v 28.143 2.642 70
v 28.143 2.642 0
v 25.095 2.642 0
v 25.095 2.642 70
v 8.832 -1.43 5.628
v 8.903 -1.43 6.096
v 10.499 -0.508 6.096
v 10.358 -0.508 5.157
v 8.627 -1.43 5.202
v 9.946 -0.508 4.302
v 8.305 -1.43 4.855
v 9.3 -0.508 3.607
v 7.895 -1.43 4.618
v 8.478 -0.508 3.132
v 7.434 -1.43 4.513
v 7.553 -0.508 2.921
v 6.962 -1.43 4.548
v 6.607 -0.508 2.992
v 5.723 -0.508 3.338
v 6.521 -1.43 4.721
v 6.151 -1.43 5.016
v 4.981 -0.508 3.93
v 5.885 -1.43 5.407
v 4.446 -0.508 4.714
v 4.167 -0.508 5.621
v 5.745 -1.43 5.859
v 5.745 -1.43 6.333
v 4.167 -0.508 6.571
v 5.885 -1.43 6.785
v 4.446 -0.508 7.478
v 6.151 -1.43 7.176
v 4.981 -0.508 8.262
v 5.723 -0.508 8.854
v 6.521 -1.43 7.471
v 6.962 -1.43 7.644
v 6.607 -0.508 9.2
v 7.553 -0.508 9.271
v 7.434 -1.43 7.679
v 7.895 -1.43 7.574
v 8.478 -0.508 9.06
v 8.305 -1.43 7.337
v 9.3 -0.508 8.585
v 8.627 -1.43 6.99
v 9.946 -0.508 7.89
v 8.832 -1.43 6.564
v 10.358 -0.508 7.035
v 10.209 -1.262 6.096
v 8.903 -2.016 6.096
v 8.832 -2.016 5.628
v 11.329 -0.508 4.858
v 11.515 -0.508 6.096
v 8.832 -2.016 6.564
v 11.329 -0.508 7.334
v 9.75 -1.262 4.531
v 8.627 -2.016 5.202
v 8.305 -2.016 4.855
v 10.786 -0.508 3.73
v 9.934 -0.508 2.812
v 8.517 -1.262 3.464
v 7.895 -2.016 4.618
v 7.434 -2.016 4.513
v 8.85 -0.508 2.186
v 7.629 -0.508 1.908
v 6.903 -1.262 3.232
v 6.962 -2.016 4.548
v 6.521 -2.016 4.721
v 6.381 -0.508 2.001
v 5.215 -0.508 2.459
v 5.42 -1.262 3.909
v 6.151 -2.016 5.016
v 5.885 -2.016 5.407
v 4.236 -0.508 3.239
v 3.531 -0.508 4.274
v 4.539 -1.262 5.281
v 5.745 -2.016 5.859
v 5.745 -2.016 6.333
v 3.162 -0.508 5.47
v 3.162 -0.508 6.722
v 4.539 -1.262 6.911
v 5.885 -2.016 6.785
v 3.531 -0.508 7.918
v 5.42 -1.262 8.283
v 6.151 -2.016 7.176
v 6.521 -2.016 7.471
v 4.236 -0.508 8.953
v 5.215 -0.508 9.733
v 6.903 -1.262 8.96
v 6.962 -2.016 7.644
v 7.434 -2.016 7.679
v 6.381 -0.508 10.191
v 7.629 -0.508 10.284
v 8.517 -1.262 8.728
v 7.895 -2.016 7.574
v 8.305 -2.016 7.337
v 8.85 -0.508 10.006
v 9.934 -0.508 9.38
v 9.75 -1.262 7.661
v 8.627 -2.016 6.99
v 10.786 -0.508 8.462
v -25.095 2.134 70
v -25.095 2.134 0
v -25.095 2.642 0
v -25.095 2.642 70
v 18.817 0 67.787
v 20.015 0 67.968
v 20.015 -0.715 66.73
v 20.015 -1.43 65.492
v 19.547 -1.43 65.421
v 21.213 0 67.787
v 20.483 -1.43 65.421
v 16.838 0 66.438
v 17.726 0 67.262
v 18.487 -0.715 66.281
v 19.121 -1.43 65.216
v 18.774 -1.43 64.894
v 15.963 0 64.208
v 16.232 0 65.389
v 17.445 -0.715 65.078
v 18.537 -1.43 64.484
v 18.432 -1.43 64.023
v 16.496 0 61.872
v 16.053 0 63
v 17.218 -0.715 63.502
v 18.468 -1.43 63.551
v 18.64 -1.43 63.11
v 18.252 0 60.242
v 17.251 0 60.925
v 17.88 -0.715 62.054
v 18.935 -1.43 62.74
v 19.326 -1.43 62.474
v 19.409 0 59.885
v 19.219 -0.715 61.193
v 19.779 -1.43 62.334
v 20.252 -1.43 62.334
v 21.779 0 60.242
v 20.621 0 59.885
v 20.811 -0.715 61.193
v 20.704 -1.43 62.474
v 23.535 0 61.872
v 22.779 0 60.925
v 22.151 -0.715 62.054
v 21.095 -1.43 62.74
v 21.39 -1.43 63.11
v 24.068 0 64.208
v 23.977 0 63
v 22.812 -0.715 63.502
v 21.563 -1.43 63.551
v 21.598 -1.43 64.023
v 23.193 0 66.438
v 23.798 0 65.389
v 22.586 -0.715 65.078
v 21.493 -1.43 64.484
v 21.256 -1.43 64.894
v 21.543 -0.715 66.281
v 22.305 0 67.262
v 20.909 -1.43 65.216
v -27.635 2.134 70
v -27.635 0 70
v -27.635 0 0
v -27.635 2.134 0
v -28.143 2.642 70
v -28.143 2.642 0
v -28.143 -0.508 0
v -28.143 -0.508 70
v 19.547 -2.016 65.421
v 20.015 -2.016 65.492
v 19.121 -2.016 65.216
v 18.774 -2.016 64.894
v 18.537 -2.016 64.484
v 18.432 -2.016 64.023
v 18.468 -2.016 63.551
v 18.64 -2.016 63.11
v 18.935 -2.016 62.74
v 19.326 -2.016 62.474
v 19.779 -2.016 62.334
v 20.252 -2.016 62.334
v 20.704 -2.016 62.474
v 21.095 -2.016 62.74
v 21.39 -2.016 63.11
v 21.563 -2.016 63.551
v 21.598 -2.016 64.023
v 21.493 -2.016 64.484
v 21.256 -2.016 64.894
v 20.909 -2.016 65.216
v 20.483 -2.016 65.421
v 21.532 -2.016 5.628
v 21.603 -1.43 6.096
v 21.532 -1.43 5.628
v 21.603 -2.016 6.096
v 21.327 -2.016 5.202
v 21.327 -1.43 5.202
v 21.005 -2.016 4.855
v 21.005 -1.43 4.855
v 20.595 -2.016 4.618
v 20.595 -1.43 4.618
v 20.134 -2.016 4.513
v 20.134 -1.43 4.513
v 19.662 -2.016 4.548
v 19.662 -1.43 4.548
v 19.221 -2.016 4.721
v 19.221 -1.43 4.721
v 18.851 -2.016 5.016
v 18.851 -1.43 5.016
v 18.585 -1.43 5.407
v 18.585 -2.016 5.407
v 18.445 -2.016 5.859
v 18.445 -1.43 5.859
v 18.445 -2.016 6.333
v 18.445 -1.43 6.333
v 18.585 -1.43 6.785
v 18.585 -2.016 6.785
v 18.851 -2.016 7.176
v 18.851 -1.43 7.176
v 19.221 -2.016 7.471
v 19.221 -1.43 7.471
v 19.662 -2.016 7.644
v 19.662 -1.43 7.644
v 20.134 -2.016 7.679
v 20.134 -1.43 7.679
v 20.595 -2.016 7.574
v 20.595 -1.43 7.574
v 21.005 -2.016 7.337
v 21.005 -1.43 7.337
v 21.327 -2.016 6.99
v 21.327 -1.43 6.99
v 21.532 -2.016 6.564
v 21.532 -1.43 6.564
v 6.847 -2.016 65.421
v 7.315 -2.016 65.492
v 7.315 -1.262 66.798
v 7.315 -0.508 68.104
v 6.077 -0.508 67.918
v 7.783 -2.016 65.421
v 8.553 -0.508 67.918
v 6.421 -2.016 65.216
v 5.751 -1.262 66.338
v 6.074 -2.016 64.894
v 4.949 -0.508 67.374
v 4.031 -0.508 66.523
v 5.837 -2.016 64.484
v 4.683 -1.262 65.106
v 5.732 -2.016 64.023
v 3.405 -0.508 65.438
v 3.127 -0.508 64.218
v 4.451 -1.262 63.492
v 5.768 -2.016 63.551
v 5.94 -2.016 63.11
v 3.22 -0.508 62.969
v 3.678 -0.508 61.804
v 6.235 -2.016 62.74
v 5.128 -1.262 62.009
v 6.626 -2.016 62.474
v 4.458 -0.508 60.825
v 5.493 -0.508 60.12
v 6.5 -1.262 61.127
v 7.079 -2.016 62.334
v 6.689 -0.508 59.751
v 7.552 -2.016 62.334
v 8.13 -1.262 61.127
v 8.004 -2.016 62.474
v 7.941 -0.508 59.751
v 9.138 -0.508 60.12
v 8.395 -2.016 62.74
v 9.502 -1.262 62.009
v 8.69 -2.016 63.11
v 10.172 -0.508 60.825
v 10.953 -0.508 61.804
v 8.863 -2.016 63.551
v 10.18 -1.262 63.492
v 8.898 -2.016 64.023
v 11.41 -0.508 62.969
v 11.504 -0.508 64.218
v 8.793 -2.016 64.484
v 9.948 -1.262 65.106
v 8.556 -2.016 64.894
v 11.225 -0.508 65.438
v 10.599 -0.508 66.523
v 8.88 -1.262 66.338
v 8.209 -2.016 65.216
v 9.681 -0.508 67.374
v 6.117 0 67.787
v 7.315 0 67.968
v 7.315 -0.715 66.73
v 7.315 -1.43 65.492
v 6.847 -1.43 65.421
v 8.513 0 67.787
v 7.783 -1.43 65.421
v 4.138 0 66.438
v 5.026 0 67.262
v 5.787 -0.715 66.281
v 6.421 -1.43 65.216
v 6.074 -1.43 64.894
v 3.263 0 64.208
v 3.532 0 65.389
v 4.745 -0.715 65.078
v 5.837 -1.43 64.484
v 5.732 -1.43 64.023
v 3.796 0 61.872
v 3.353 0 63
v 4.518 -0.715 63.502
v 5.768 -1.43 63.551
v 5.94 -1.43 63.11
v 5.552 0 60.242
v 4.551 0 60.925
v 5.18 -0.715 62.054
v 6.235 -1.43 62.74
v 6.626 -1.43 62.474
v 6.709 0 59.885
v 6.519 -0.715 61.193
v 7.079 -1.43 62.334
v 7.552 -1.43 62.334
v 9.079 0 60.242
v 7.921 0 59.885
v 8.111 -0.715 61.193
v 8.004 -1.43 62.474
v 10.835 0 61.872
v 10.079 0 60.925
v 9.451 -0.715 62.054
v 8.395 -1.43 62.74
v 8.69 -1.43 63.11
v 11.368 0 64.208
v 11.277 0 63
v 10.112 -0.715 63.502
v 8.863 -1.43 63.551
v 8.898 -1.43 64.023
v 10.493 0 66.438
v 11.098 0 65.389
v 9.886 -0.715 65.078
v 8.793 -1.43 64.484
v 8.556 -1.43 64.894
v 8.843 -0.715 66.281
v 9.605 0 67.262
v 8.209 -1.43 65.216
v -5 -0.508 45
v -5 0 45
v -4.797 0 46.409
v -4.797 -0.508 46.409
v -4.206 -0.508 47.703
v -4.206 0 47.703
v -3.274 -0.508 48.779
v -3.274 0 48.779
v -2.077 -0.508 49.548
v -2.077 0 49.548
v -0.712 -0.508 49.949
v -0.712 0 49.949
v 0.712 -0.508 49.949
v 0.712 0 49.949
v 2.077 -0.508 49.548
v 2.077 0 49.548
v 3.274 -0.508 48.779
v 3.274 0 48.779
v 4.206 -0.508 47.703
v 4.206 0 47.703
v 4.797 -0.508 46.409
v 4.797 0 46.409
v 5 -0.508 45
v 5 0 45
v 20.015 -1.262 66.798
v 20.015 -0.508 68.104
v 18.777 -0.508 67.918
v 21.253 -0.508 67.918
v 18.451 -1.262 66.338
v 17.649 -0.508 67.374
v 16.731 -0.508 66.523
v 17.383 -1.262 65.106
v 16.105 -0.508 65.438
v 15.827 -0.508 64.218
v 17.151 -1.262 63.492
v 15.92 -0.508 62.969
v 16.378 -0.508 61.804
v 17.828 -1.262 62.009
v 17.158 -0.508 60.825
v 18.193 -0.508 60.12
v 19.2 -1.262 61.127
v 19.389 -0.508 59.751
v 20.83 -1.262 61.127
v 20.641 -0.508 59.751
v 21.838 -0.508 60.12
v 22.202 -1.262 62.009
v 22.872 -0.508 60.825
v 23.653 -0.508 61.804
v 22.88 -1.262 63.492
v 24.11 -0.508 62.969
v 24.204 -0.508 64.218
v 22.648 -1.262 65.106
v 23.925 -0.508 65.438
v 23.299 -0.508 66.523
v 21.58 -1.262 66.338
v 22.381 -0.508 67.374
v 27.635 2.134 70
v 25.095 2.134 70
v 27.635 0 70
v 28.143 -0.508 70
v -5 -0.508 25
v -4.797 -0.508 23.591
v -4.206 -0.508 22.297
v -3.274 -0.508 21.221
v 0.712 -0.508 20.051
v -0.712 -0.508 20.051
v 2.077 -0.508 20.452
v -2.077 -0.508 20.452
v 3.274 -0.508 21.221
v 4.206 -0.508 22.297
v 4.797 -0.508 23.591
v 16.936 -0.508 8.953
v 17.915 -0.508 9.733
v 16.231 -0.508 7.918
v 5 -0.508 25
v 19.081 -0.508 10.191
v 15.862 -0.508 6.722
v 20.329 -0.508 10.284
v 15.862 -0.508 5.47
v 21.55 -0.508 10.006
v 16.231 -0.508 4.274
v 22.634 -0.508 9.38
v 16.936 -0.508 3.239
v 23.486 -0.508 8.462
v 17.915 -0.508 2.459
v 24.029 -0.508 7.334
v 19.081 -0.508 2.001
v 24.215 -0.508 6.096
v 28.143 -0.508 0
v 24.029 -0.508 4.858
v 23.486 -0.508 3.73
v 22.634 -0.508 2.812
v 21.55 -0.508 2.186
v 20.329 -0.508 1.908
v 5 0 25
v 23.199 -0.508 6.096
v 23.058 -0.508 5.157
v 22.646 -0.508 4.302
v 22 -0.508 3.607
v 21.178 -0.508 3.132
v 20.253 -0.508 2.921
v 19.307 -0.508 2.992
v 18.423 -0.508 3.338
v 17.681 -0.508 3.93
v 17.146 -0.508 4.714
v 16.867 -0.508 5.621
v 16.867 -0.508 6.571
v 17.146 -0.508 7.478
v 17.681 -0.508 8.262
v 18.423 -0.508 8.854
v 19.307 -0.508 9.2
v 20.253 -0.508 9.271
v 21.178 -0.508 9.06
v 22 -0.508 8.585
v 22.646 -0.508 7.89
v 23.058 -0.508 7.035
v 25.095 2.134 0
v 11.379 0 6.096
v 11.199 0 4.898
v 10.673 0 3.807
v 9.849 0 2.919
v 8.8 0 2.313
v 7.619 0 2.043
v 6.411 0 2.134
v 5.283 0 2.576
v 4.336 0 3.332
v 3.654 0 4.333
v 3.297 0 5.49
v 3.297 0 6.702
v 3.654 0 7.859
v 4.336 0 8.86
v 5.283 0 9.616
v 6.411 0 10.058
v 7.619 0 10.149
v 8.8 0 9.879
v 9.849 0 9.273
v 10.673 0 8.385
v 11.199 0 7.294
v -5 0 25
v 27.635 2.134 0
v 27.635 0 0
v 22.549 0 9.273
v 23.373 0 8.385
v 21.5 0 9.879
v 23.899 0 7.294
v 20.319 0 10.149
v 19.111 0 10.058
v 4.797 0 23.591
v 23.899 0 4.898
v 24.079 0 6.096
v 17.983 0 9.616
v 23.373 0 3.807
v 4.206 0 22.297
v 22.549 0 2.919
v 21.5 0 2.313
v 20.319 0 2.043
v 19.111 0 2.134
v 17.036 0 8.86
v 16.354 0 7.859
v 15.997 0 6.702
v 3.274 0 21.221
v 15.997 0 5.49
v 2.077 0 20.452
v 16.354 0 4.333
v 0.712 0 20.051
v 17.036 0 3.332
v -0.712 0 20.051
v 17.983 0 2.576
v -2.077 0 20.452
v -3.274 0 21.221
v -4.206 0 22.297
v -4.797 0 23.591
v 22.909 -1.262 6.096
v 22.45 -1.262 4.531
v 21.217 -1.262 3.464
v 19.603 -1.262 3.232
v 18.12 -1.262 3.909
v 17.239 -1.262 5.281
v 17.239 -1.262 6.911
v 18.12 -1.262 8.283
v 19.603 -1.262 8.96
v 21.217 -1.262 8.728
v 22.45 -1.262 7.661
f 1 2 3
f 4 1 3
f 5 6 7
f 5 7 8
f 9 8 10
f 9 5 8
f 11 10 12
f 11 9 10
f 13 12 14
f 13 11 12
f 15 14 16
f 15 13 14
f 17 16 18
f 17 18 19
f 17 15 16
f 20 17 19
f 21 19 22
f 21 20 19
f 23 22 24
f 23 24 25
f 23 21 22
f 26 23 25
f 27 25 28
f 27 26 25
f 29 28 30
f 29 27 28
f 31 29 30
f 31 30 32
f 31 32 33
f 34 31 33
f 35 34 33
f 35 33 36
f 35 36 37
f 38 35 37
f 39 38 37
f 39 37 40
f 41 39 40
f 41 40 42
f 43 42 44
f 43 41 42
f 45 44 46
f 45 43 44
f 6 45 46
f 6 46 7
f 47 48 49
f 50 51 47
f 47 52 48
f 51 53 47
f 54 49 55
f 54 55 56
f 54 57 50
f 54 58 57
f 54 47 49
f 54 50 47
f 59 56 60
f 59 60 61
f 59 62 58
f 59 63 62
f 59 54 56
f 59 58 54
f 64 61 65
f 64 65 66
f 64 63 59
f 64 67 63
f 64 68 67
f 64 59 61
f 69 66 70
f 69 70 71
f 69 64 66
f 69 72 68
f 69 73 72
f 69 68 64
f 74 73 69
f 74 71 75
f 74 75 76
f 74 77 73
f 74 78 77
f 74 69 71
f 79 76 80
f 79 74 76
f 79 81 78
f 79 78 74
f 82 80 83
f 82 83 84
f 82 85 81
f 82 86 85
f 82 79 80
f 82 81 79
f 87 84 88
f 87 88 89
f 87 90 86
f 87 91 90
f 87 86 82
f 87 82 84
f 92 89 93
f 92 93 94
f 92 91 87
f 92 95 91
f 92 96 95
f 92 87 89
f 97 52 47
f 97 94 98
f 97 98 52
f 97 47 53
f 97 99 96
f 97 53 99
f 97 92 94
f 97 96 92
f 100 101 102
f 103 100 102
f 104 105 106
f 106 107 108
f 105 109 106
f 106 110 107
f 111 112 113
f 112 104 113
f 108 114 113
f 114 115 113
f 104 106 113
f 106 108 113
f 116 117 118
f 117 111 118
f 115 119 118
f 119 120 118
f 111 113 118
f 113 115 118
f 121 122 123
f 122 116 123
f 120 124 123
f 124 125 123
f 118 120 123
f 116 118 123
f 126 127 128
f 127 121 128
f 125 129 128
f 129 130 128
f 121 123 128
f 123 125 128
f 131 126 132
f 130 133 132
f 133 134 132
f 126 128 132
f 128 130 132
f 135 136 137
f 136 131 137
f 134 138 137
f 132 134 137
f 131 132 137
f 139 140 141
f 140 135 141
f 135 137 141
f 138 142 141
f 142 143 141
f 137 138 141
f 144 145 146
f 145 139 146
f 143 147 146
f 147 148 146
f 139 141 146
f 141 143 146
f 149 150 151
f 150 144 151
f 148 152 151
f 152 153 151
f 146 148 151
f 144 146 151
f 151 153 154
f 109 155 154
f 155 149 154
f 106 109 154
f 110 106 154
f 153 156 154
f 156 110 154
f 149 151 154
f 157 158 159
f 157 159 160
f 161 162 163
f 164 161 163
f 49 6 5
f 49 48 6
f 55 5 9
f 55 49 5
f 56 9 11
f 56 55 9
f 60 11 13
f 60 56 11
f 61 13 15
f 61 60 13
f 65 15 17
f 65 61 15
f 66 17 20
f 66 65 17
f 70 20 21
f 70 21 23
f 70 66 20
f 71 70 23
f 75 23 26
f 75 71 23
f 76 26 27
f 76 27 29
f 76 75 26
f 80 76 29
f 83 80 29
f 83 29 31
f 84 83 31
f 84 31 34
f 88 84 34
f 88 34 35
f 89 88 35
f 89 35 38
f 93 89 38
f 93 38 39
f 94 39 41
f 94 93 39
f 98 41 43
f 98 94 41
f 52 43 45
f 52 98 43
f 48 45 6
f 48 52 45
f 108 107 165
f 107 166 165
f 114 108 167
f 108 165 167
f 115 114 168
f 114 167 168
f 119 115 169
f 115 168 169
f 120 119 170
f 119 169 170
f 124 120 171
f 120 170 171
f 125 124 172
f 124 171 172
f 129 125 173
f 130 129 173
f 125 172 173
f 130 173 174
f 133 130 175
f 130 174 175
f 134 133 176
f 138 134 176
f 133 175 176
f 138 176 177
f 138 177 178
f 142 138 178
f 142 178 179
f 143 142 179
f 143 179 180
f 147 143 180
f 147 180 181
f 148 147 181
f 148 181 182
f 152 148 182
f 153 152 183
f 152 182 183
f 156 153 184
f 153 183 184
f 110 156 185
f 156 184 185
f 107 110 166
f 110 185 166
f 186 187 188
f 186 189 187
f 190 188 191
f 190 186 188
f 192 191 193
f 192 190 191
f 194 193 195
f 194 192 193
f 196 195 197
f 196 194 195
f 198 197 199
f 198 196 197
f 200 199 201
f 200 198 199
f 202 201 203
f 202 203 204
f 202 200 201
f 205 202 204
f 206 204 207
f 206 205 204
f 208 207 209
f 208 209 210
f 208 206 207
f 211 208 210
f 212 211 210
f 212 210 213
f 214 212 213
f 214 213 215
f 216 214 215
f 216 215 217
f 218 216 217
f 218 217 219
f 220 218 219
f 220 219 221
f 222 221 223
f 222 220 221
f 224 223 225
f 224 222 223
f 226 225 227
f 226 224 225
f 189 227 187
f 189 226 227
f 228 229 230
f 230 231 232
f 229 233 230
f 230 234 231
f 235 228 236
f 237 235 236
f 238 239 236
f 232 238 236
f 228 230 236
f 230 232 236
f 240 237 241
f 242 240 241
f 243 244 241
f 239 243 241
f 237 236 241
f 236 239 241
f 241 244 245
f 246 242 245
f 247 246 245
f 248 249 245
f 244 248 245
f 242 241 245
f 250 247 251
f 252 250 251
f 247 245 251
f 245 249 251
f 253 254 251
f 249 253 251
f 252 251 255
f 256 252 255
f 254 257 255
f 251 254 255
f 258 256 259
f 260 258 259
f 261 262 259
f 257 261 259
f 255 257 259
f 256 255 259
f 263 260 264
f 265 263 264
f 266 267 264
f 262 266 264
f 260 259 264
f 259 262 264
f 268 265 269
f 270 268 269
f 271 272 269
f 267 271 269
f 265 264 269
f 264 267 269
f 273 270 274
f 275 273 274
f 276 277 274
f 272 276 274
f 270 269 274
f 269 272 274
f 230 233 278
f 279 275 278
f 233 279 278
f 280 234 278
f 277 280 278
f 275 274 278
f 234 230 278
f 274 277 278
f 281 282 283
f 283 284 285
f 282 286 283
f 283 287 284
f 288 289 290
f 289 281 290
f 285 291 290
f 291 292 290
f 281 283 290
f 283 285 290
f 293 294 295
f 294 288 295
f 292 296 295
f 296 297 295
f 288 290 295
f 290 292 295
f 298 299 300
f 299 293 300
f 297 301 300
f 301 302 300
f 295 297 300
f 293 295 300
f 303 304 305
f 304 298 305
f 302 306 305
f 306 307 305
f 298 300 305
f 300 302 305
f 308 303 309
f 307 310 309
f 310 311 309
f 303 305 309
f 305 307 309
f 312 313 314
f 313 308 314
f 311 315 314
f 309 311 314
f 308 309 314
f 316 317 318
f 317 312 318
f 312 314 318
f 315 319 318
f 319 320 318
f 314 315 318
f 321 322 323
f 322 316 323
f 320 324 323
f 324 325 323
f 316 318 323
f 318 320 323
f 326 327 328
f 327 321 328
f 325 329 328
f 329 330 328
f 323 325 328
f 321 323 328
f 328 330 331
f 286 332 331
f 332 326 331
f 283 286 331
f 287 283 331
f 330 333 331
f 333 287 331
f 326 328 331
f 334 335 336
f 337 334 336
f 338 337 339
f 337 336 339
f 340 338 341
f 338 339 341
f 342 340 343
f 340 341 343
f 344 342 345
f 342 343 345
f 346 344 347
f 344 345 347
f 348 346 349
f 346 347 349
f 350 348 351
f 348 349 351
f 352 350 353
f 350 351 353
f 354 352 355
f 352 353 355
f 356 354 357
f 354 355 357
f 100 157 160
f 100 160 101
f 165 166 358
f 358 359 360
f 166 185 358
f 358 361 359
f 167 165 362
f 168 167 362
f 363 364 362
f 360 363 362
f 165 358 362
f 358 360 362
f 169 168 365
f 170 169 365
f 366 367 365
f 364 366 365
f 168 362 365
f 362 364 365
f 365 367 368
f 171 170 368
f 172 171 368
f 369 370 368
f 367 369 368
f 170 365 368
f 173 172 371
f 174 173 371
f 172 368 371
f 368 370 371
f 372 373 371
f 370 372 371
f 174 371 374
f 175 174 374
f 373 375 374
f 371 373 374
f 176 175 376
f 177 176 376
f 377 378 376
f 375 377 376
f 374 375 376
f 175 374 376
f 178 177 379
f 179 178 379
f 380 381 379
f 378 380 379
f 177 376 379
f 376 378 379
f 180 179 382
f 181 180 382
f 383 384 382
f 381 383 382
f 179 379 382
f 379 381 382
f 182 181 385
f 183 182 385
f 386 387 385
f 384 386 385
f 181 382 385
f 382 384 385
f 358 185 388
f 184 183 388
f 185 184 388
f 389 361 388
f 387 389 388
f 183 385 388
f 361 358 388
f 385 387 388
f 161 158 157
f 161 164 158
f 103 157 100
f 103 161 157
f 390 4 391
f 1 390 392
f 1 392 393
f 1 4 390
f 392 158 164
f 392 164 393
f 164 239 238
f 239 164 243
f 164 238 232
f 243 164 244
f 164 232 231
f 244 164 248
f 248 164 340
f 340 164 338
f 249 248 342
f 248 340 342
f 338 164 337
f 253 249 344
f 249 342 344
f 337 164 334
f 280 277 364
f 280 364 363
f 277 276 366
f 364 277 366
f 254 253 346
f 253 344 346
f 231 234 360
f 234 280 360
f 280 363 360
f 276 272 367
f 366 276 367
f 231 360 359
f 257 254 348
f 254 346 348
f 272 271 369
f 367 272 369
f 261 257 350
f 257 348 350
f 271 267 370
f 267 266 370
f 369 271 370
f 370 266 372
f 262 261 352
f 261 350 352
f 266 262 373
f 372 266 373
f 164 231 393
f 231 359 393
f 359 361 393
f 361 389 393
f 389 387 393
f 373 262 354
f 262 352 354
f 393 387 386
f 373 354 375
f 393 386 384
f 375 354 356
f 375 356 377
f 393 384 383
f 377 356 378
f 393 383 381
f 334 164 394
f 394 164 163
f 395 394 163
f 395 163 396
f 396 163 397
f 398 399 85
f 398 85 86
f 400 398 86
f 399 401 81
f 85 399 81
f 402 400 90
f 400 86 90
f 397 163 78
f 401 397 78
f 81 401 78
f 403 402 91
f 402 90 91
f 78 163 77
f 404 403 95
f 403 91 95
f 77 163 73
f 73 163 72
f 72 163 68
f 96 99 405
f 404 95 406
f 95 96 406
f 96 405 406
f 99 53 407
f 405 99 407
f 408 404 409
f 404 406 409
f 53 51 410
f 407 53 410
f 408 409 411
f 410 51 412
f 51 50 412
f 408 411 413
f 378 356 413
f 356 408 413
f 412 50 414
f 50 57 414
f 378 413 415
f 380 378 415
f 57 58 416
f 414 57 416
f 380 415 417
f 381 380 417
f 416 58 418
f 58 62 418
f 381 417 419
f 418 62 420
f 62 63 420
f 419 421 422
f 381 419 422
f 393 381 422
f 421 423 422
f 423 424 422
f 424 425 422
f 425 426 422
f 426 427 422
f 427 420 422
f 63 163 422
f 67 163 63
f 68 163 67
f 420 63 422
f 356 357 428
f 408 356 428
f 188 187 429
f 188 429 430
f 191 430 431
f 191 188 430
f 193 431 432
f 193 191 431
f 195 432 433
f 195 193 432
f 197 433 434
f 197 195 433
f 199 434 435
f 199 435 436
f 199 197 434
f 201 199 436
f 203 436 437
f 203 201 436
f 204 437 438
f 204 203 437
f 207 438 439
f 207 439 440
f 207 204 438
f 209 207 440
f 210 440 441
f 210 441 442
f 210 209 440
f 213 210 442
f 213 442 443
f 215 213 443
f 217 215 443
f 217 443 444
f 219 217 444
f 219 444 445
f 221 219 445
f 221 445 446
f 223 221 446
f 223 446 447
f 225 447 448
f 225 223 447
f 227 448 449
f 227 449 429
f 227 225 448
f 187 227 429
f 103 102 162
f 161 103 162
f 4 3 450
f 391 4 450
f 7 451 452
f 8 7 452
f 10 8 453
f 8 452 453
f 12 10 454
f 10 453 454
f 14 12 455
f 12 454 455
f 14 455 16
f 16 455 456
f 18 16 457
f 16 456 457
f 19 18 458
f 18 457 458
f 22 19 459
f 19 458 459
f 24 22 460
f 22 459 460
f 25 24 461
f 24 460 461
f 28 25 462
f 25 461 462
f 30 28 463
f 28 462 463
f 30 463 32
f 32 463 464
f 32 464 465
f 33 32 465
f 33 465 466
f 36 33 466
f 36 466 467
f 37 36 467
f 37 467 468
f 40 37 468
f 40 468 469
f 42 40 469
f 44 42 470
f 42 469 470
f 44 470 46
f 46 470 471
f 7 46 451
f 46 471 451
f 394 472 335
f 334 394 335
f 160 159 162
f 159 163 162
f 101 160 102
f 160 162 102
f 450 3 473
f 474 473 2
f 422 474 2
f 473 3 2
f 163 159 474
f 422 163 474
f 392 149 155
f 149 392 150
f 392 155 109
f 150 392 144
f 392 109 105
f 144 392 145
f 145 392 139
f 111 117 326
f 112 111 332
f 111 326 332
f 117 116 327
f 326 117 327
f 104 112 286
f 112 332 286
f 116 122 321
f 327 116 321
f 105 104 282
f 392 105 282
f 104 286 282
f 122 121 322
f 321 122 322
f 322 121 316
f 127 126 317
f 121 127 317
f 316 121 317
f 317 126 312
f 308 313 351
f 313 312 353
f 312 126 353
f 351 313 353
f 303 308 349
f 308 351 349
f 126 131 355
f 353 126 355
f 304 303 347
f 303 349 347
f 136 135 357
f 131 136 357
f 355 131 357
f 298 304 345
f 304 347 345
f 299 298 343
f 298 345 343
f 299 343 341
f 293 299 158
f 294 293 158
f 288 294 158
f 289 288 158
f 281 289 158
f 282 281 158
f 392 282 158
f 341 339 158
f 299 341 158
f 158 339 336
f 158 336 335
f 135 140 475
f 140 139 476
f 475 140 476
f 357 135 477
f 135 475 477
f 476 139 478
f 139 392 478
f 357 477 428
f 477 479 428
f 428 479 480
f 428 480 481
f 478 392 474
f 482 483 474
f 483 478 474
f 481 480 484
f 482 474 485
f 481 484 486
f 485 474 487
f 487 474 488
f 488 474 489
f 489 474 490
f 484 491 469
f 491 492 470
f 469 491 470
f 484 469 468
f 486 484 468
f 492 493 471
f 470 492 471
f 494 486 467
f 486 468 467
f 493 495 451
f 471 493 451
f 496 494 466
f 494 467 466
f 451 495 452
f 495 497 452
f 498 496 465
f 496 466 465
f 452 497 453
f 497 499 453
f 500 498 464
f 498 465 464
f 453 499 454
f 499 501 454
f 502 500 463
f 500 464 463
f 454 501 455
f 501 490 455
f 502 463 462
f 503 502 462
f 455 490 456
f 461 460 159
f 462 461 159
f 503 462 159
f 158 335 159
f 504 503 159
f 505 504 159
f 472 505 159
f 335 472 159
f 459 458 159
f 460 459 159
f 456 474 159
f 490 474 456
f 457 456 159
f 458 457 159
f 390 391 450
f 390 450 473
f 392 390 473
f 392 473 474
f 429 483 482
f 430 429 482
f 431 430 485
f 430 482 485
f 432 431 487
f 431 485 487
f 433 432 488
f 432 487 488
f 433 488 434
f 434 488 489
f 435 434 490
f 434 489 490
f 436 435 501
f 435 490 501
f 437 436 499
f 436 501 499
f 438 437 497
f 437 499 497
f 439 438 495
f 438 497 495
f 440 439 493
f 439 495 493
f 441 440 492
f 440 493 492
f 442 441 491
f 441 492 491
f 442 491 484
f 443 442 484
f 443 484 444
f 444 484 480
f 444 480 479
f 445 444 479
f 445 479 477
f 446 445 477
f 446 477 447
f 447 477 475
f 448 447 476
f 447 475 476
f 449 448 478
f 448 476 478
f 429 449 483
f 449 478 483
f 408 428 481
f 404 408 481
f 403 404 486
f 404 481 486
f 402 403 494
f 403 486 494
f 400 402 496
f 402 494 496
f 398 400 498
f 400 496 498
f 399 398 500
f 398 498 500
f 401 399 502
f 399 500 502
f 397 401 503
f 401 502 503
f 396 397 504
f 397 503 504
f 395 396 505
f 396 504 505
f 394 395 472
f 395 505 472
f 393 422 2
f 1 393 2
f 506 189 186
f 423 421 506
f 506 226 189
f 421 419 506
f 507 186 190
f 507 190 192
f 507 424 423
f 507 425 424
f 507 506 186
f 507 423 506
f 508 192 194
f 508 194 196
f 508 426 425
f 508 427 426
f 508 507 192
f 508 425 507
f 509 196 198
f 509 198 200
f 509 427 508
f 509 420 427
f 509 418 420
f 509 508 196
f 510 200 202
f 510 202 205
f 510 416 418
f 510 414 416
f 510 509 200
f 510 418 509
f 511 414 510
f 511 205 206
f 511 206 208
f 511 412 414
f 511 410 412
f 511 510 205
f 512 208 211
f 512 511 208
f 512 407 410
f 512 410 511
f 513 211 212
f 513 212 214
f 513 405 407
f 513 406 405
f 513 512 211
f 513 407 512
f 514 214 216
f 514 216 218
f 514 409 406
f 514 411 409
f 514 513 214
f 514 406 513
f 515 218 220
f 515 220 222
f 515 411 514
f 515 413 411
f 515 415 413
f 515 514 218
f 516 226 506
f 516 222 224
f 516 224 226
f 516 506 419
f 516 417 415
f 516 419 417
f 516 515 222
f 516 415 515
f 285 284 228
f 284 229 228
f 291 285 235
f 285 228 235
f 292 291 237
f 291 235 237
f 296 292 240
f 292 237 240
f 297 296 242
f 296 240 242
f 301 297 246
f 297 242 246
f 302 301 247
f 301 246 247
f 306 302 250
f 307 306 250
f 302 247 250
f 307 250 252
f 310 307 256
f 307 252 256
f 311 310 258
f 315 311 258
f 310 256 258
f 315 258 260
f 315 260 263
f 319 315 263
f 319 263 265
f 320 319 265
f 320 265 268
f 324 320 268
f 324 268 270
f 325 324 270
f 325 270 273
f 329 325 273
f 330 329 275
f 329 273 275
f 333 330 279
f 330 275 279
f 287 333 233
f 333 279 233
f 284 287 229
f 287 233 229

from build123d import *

# Parameters (mm, degrees)
EXTRUDE_THIN3_DEPTH     = 70
CUT_EXTRUDE1_DEPTH      = 76.511321578
CUT_EXTRUDE1_DEPTH_BACK = 76.511321578
SKETCH9_R               = 4.064
CUT_EXTRUDE2_DEPTH      = 2.54
LPATTERN1_COUNT         = 2
LPATTERN1_PITCH         = 12.7


# Read off the part's stored shape, not the designer's step: Mirror1
with BuildPart() as part:
    # Sketch6 → Extrude-Thin3 (new body)
    with BuildSketch(Plane.XY):
        Polygon((25.0952, 2.1336), (27.6352, 2.1336), (27.6352, 0), (-27.6352, 0), (-27.6352, 2.1336), (-25.0952, 2.1336), (-25.0952, 2.6416), (-28.1432, 2.6416), (-28.1432, -0.508), (28.1432, -0.508), (28.1432, 2.6416), (25.0952, 2.6416), align=None)
    extrude(amount=EXTRUDE_THIN3_DEPTH)

    # Sketch8 → Cut-Extrude1 (cut, two sides: drawn at the far end of the back side and taken through both)
    with BuildSketch(Plane.XZ.offset(0.508).offset(-CUT_EXTRUDE1_DEPTH_BACK)):
        with BuildLine():
            Line((5, 45), (5, 25))
            ThreePointArc((5, 25), (0, 20), (-5, 25))
            Line((-5, 25), (-5, 45))
            ThreePointArc((-5, 45), (0, 50), (5, 45))
        make_face()
    extrude(amount=CUT_EXTRUDE1_DEPTH + CUT_EXTRUDE1_DEPTH_BACK, mode=Mode.SUBTRACT)

    # Sketch9 → Cut-Extrude2 (cut)
    with BuildSketch(Plane.XZ.offset(0.508)):
        with Locations(Location((20.0152, 63.904, 0), (0, 0, 270))):
            Circle(SKETCH9_R)
    cut_extrude2 = extrude(amount=-CUT_EXTRUDE2_DEPTH, mode=Mode.SUBTRACT)

    # Sketch10 → Revolve1 (revolve)
    with BuildSketch(Plane(origin=(0, 0, 63.904), x_dir=(0, -1, 0), z_dir=(0, 0, 1)), mode=Mode.PRIVATE) as revolve1_sk:
        Polygon((0, 24.0792), (1.429807942, 21.6027), (2.016395815, 21.6027), (0, 25.0952), align=None)
    revolve1 = revolve(revolve1_sk.sketch.rotate(Axis((20.0152, 10.109887768, 63.904), (0, -1, 0)), 90), axis=Axis((20.0152, 10.109887768, 63.904), (0, -1, 0)))

    # LPattern1: Cut-Extrude2, Revolve1 ×2
    with Locations(*[(-i * LPATTERN1_PITCH, 0, 0) for i in range(1, LPATTERN1_COUNT)]):
        add(cut_extrude2, mode=Mode.SUBTRACT)
        add(revolve1)

    # Mirror1 outline → Mirror1 (revolve)
    with BuildSketch(Plane(origin=(20.0152, 0, 6.096), x_dir=(1, 0, 0), z_dir=(0, 0, 1))):
        Polygon((3.18411819, -0.508), (1.5875, -1.429807942), (1.5875, -2.016395815), (4.20011819, -0.508), align=None)
    revolve(axis=Axis((20.0152, 0, 6.096), (0, 1, 0)))

    # Mirror1 2 outline → Mirror1 2 (revolve)
    with BuildSketch(Plane(origin=(7.3152, 0, 6.096), x_dir=(1, 0, 0), z_dir=(0, 0, 1))):
        Polygon((3.18411819, -0.508), (1.5875, -1.429807942), (1.5875, -2.016395815), (4.20011819, -0.508), align=None)
    revolve(axis=Axis((7.3152, 0, 6.096), (0, 1, 0)))

    # Mirror1 3 outline → Mirror1 3 (revolve, cut)
    with BuildSketch(Plane(origin=(20.0152, 0, 6.096), x_dir=(1, 0, 0), z_dir=(0, 0, 1))):
        Polygon((3.18411819, -0.508), (4.064, 0), (0, 0), (0, -0.508), align=None)
    revolve(axis=Axis((20.0152, 0, 6.096), (0, 1, 0)), mode=Mode.SUBTRACT)

    # Mirror1 4 outline → Mirror1 4 (revolve, cut)
    with BuildSketch(Plane(origin=(7.3152, 0, 6.096), x_dir=(1, 0, 0), z_dir=(0, 0, 1))):
        Polygon((3.18411819, -0.508), (4.064, 0), (0, 0), (0, -0.508), align=None)
    revolve(axis=Axis((7.3152, 0, 6.096), (0, 1, 0)), mode=Mode.SUBTRACT)


solid = part.part
